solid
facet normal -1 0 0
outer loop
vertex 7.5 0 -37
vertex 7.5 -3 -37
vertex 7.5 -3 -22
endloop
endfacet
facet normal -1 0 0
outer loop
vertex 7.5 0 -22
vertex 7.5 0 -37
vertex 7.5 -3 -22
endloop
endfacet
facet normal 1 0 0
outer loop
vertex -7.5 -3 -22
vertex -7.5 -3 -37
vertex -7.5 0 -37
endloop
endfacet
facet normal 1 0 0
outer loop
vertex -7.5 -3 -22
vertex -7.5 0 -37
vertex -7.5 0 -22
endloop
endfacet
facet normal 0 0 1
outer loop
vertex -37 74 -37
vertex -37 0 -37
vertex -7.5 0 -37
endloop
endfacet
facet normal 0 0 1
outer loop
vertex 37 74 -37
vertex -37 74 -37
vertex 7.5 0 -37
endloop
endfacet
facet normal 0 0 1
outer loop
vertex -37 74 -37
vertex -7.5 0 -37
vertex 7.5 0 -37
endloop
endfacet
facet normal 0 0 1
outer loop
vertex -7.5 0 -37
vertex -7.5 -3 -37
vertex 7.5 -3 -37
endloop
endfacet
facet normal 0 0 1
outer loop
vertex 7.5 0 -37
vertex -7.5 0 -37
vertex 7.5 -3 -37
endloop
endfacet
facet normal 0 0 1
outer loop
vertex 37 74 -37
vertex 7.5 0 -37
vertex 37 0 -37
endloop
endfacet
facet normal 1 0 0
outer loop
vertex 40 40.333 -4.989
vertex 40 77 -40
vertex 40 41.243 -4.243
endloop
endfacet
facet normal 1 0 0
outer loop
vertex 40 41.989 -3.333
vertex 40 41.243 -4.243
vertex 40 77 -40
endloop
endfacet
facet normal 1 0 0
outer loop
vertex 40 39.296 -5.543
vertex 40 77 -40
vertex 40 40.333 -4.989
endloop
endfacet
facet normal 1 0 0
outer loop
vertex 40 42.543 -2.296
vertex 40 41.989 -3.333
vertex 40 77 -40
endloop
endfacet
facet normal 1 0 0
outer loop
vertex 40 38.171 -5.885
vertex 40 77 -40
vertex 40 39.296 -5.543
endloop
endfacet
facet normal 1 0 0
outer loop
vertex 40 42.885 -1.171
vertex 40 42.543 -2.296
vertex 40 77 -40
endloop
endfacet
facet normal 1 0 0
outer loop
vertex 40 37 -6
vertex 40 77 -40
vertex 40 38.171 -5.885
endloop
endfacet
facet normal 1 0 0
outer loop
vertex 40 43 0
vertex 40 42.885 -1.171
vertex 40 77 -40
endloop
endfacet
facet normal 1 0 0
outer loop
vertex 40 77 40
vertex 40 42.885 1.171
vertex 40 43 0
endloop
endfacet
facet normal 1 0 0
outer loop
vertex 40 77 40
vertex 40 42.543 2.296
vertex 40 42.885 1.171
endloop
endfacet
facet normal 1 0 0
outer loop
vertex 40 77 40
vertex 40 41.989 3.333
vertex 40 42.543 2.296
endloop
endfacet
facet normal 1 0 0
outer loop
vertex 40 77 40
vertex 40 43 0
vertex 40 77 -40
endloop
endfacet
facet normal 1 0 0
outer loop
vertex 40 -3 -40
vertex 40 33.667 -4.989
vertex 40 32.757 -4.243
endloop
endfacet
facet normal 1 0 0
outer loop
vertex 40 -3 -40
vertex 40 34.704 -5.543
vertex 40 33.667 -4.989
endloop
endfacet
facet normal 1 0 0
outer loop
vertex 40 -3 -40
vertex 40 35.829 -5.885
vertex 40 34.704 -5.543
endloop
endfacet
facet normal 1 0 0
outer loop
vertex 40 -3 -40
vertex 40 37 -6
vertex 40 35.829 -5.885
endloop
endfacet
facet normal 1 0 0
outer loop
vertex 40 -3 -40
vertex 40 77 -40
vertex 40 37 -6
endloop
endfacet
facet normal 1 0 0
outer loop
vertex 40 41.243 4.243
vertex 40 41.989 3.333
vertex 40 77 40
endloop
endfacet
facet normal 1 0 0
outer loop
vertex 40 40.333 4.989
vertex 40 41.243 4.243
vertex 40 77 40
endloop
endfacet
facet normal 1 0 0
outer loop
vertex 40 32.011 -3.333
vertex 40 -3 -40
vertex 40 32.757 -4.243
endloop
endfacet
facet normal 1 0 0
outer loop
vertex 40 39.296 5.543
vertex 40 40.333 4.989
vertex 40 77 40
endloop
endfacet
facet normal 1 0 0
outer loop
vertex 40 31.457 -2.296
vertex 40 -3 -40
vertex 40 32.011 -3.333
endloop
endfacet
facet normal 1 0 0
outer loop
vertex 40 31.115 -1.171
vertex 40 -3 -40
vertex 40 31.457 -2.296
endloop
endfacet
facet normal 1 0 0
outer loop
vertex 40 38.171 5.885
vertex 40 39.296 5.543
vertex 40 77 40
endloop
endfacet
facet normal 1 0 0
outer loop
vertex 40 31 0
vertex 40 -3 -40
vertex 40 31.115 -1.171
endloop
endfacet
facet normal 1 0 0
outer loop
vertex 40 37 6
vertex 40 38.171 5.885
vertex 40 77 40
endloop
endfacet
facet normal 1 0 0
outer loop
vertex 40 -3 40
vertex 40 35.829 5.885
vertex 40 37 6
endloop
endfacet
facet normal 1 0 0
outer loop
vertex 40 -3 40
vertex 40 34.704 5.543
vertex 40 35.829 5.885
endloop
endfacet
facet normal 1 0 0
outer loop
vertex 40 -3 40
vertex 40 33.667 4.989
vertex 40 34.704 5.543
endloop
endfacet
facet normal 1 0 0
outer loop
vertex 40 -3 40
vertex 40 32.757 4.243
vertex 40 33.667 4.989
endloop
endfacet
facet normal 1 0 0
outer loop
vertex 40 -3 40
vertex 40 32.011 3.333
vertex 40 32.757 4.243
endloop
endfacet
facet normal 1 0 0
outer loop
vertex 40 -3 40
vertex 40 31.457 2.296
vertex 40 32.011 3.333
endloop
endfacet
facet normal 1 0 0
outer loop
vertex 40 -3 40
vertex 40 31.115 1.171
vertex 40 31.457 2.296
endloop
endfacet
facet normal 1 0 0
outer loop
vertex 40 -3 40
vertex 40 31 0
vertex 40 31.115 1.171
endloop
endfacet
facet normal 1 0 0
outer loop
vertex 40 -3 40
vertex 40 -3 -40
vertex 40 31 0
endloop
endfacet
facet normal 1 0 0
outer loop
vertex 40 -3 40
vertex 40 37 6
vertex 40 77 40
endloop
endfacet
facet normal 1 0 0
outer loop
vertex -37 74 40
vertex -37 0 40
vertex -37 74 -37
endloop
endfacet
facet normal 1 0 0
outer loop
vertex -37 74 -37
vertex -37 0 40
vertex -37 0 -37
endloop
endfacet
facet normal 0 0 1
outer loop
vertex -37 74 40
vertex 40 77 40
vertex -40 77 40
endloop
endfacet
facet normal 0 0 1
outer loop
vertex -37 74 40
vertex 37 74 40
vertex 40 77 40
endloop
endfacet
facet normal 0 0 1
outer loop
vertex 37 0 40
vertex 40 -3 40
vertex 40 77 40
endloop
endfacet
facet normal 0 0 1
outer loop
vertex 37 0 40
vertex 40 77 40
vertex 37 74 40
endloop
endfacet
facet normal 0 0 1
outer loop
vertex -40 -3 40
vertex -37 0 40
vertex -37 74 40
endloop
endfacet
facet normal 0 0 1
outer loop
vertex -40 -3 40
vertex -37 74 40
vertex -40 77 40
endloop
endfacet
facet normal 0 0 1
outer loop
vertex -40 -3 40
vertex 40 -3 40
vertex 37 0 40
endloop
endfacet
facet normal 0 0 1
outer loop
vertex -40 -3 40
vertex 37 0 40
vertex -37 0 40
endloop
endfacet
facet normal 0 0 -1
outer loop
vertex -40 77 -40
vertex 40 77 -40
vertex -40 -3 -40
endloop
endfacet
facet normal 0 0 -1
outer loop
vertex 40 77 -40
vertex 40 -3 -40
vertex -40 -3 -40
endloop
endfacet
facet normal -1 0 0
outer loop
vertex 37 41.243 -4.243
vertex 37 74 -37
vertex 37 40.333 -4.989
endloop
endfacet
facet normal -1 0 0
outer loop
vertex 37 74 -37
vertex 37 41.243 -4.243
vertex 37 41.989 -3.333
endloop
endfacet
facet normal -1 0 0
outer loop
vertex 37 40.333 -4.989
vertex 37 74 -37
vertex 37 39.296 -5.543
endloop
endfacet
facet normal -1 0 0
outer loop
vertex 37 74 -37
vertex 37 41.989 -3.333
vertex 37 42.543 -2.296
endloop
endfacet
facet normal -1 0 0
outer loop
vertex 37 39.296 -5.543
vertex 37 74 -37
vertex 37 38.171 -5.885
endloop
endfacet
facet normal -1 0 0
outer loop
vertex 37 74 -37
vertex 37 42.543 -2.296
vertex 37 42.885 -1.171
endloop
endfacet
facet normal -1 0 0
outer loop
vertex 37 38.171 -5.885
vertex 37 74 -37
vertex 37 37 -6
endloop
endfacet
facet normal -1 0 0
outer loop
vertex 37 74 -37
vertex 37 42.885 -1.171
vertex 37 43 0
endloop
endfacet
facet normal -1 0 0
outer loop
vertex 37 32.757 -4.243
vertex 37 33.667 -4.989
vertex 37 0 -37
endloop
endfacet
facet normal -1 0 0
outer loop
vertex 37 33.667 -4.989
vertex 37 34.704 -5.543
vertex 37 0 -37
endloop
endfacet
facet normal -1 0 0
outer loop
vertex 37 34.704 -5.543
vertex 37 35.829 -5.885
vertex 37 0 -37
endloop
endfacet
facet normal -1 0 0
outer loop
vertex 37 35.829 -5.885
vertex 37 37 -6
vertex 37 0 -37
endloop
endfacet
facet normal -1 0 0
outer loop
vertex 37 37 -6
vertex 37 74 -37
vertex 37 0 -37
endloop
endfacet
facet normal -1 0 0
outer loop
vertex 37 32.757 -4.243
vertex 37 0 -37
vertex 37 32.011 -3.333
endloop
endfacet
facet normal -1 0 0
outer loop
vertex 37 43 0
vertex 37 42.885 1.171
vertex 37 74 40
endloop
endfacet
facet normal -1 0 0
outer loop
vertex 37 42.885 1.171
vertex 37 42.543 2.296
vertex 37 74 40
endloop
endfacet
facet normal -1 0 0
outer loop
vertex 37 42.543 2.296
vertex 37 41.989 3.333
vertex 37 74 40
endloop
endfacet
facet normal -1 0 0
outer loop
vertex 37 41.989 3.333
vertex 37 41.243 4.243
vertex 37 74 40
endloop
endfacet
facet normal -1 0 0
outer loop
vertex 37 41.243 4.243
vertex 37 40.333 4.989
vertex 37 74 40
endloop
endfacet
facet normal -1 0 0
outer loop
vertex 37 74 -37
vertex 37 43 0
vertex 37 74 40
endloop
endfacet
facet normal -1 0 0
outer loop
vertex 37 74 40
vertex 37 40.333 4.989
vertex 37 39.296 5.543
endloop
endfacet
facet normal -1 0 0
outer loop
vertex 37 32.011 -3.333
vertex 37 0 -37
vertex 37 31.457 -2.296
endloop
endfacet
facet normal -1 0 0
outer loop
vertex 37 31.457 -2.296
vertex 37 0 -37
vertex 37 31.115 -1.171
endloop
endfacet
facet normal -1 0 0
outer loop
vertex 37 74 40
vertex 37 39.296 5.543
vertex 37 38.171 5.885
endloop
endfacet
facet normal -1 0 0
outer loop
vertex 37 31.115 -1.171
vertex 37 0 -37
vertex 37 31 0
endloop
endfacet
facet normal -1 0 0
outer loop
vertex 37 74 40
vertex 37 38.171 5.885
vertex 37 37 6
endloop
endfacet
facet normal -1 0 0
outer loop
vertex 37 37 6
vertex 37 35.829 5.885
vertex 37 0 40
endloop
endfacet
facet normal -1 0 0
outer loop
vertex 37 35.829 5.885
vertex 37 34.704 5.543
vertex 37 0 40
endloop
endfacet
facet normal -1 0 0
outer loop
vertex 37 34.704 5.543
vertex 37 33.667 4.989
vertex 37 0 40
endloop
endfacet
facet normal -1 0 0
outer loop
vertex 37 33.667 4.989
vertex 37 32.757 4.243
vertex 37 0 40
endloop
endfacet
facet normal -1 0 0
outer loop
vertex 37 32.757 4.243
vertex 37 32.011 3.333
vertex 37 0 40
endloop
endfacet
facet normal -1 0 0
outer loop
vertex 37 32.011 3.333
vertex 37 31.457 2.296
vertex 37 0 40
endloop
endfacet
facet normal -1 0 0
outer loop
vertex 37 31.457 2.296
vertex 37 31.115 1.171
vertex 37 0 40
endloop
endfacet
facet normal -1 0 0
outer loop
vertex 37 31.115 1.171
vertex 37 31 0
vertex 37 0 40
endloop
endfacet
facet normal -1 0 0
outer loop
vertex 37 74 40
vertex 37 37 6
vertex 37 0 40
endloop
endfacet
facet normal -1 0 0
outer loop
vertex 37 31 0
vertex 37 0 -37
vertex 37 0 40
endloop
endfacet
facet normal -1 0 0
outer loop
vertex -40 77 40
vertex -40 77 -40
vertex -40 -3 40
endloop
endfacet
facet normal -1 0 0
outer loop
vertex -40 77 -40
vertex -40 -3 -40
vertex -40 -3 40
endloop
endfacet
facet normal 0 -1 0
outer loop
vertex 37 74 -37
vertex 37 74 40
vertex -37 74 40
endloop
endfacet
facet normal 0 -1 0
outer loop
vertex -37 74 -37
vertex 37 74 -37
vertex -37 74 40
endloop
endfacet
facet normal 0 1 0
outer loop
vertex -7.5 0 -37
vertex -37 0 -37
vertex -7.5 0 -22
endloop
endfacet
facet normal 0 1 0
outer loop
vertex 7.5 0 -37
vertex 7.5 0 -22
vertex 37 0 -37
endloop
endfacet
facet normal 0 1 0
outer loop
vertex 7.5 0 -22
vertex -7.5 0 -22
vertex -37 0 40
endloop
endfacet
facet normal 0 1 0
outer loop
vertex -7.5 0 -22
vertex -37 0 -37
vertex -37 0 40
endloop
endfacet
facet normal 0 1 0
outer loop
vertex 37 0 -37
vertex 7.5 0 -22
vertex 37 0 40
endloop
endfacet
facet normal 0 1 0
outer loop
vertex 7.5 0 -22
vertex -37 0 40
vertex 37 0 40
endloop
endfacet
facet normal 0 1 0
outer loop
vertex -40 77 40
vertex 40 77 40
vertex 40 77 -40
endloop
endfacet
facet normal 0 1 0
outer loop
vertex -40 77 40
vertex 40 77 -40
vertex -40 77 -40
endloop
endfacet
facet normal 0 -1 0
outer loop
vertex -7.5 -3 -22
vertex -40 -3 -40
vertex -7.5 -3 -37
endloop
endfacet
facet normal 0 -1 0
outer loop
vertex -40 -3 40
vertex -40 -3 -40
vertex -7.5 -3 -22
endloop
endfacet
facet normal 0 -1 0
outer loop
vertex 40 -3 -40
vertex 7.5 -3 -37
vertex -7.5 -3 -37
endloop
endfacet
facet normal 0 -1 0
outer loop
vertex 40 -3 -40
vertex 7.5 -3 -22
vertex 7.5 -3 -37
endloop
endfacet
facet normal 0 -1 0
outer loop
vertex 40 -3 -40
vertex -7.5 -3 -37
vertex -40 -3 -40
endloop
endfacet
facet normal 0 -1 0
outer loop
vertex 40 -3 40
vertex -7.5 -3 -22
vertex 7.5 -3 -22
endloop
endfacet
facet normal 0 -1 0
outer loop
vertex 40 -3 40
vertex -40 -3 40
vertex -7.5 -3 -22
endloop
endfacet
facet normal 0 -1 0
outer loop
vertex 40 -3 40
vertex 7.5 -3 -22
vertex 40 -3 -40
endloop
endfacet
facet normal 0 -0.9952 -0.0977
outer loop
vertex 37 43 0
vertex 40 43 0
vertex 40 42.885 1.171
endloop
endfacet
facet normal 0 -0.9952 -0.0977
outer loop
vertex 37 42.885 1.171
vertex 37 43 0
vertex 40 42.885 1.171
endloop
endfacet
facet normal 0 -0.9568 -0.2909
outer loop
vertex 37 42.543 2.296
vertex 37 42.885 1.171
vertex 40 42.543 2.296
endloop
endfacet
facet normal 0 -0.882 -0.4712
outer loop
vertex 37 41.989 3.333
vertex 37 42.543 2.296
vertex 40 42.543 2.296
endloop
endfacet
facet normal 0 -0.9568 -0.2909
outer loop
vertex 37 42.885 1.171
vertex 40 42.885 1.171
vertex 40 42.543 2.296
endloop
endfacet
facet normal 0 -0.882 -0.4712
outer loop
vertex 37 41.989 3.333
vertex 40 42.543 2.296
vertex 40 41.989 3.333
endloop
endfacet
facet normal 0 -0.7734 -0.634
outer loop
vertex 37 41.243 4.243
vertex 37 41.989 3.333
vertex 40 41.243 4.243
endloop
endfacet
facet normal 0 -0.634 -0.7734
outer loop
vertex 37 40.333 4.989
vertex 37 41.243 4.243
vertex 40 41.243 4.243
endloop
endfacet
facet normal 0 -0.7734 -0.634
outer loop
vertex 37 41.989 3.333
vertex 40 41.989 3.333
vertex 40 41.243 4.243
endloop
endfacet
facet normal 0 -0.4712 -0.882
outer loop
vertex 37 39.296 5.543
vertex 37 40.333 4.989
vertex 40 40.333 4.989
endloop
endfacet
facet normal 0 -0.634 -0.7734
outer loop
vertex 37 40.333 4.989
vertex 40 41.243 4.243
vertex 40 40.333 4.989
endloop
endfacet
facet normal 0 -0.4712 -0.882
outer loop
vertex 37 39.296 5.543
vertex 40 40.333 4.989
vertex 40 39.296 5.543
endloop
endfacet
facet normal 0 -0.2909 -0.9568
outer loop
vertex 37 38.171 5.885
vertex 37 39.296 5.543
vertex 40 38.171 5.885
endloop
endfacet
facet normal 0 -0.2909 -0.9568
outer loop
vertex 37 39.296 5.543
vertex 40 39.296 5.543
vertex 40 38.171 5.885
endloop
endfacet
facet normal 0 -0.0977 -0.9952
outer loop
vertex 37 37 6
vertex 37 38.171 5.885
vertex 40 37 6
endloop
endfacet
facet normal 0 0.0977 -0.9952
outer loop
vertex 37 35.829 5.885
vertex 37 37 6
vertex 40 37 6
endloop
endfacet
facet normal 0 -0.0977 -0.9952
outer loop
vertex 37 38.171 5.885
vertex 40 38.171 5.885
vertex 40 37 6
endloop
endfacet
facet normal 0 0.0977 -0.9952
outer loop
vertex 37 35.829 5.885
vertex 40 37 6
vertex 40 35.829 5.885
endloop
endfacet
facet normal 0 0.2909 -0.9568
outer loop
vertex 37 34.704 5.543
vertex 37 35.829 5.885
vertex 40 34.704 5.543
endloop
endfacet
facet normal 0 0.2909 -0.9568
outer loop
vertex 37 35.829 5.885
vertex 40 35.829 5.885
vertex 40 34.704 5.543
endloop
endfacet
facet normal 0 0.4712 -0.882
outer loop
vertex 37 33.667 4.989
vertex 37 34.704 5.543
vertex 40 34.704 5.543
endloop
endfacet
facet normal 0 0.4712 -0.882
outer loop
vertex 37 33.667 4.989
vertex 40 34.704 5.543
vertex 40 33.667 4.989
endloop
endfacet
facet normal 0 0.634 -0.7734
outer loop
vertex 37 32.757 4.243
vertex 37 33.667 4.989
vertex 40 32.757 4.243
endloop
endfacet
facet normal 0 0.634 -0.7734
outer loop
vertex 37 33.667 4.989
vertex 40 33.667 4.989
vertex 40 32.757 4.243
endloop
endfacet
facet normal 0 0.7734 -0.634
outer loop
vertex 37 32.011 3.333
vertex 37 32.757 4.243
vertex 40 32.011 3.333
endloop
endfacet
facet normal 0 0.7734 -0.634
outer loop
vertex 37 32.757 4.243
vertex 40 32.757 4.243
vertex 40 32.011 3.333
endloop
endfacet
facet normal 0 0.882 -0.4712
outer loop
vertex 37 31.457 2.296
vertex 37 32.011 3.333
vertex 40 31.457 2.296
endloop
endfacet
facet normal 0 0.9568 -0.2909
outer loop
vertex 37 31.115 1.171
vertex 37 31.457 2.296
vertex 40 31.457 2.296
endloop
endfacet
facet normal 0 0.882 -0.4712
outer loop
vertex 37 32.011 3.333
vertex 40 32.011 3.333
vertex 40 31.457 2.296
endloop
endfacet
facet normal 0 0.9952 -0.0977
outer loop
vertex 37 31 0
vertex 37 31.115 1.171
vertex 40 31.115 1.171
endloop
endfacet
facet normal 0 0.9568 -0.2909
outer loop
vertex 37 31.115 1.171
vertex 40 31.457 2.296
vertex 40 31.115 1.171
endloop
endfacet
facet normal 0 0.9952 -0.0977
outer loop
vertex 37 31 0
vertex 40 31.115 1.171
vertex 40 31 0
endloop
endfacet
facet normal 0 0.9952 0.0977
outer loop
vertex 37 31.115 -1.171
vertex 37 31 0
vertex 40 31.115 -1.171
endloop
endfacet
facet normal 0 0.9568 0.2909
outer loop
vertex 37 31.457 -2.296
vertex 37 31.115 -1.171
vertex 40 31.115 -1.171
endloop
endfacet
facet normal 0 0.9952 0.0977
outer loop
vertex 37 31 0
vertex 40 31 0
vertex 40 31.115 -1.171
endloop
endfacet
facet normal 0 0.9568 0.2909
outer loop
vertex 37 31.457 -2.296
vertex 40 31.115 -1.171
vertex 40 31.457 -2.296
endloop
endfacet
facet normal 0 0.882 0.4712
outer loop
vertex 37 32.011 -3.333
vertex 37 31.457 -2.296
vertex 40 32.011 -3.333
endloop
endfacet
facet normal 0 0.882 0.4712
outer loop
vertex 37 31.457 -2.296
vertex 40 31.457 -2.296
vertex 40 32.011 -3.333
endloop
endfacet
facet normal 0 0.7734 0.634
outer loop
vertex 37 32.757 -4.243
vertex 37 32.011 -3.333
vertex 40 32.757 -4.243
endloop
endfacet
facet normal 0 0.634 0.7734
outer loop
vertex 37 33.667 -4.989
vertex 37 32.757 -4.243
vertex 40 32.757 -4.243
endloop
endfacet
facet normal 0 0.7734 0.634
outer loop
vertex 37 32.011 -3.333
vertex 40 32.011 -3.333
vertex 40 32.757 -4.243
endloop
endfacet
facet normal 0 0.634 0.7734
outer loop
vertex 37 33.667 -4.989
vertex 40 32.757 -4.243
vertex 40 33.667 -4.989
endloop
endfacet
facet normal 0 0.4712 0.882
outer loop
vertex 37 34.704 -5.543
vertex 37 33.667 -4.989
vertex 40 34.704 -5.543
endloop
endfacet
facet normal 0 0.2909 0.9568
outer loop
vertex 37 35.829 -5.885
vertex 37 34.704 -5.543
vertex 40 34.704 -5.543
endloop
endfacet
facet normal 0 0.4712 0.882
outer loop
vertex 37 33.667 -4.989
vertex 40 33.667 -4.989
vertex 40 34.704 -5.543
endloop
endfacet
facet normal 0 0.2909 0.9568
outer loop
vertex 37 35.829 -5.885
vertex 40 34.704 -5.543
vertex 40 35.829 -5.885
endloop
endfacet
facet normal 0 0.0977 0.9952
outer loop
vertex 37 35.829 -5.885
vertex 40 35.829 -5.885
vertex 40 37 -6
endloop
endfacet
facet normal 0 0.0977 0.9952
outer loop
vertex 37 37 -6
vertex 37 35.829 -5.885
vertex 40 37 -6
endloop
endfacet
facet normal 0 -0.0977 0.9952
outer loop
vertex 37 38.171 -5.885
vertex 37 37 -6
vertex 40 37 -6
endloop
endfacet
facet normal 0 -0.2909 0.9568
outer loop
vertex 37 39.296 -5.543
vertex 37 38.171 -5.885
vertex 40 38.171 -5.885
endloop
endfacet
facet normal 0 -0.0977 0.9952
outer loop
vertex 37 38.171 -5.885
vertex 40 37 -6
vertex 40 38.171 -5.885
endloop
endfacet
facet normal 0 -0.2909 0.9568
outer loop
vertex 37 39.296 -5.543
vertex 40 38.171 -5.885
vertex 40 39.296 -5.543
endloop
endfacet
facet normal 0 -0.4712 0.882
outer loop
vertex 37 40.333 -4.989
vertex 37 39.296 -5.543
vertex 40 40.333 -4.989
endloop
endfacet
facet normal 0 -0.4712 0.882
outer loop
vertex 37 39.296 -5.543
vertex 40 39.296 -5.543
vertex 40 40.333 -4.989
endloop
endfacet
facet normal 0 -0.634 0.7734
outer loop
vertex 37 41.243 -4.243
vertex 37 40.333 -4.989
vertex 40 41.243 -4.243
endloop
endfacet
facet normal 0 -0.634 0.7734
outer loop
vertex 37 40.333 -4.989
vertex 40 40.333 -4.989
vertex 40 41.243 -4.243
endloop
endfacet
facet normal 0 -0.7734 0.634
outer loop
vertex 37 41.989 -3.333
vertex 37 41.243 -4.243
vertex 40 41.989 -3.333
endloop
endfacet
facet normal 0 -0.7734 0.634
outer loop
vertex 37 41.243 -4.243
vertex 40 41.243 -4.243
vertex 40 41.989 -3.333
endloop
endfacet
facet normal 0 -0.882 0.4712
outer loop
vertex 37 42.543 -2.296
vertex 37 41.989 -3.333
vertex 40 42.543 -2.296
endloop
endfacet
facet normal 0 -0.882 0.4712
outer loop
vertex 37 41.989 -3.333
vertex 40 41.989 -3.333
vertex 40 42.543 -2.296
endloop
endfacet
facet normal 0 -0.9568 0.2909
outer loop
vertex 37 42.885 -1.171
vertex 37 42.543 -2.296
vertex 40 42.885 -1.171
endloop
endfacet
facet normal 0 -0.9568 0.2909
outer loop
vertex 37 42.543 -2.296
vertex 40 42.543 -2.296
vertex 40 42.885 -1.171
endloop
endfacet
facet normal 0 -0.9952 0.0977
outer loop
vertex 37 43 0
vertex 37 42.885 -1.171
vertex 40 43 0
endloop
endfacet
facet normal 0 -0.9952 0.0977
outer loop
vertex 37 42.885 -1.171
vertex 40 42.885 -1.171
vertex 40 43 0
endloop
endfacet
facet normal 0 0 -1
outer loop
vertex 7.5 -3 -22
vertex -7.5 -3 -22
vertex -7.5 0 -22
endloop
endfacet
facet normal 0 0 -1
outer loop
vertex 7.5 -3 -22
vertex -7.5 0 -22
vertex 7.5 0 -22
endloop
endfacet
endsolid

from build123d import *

# Parameters (mm, degrees)
F0_W     = 80
F0_H     = 80
F1_DEPTH = 3
F3_DEPTH = 74
F4_W     = 80
F4_H     = 80
F5_DEPTH = 3
F6_R     = 6
F7_DEPTH = 3
F8_W     = 15
F8_H     = 15
F9_DEPTH = 3


with BuildPart() as f1:
    # F0 (on Front) → F1 (new body)
    with BuildSketch(Plane.XZ):
        Rectangle(F0_W, F0_H)
    extrude(amount=F1_DEPTH)

    # F2 (on face) → F3 (join)
    with BuildSketch(Plane(origin=(0, 0, 0), x_dir=(-1, 0, 0), z_dir=(0, 1, 0))):
        Polygon((-40, -40), (40, -40), (40, 40), (37, 40), (37, 37), (37, -37), (-37, -37), (-37, 37), (-37, 40), (-40, 40), align=None)
    extrude(amount=F3_DEPTH)

    # F4 (on face) → F5 (join)
    with BuildSketch(Plane(origin=(0, 74, 0), x_dir=(-1, 0, 0), z_dir=(0, 1, 0))):
        Rectangle(F4_W, F4_H)
    extrude(amount=F5_DEPTH)

    # F6 (on face) → F7 (cut)
    with BuildSketch(Plane.YZ.offset(40)):
        with Locations((37, 0)):
            Circle(F6_R)
    extrude(amount=-F7_DEPTH, mode=Mode.SUBTRACT)

    # F8 (on face) → F9 (cut)
    with BuildSketch(Plane.XZ.offset(3)):
        with Locations((0, -29.5)):
            Rectangle(F8_W, F8_H)
    extrude(amount=-F9_DEPTH, mode=Mode.SUBTRACT)


solid = f1.part
